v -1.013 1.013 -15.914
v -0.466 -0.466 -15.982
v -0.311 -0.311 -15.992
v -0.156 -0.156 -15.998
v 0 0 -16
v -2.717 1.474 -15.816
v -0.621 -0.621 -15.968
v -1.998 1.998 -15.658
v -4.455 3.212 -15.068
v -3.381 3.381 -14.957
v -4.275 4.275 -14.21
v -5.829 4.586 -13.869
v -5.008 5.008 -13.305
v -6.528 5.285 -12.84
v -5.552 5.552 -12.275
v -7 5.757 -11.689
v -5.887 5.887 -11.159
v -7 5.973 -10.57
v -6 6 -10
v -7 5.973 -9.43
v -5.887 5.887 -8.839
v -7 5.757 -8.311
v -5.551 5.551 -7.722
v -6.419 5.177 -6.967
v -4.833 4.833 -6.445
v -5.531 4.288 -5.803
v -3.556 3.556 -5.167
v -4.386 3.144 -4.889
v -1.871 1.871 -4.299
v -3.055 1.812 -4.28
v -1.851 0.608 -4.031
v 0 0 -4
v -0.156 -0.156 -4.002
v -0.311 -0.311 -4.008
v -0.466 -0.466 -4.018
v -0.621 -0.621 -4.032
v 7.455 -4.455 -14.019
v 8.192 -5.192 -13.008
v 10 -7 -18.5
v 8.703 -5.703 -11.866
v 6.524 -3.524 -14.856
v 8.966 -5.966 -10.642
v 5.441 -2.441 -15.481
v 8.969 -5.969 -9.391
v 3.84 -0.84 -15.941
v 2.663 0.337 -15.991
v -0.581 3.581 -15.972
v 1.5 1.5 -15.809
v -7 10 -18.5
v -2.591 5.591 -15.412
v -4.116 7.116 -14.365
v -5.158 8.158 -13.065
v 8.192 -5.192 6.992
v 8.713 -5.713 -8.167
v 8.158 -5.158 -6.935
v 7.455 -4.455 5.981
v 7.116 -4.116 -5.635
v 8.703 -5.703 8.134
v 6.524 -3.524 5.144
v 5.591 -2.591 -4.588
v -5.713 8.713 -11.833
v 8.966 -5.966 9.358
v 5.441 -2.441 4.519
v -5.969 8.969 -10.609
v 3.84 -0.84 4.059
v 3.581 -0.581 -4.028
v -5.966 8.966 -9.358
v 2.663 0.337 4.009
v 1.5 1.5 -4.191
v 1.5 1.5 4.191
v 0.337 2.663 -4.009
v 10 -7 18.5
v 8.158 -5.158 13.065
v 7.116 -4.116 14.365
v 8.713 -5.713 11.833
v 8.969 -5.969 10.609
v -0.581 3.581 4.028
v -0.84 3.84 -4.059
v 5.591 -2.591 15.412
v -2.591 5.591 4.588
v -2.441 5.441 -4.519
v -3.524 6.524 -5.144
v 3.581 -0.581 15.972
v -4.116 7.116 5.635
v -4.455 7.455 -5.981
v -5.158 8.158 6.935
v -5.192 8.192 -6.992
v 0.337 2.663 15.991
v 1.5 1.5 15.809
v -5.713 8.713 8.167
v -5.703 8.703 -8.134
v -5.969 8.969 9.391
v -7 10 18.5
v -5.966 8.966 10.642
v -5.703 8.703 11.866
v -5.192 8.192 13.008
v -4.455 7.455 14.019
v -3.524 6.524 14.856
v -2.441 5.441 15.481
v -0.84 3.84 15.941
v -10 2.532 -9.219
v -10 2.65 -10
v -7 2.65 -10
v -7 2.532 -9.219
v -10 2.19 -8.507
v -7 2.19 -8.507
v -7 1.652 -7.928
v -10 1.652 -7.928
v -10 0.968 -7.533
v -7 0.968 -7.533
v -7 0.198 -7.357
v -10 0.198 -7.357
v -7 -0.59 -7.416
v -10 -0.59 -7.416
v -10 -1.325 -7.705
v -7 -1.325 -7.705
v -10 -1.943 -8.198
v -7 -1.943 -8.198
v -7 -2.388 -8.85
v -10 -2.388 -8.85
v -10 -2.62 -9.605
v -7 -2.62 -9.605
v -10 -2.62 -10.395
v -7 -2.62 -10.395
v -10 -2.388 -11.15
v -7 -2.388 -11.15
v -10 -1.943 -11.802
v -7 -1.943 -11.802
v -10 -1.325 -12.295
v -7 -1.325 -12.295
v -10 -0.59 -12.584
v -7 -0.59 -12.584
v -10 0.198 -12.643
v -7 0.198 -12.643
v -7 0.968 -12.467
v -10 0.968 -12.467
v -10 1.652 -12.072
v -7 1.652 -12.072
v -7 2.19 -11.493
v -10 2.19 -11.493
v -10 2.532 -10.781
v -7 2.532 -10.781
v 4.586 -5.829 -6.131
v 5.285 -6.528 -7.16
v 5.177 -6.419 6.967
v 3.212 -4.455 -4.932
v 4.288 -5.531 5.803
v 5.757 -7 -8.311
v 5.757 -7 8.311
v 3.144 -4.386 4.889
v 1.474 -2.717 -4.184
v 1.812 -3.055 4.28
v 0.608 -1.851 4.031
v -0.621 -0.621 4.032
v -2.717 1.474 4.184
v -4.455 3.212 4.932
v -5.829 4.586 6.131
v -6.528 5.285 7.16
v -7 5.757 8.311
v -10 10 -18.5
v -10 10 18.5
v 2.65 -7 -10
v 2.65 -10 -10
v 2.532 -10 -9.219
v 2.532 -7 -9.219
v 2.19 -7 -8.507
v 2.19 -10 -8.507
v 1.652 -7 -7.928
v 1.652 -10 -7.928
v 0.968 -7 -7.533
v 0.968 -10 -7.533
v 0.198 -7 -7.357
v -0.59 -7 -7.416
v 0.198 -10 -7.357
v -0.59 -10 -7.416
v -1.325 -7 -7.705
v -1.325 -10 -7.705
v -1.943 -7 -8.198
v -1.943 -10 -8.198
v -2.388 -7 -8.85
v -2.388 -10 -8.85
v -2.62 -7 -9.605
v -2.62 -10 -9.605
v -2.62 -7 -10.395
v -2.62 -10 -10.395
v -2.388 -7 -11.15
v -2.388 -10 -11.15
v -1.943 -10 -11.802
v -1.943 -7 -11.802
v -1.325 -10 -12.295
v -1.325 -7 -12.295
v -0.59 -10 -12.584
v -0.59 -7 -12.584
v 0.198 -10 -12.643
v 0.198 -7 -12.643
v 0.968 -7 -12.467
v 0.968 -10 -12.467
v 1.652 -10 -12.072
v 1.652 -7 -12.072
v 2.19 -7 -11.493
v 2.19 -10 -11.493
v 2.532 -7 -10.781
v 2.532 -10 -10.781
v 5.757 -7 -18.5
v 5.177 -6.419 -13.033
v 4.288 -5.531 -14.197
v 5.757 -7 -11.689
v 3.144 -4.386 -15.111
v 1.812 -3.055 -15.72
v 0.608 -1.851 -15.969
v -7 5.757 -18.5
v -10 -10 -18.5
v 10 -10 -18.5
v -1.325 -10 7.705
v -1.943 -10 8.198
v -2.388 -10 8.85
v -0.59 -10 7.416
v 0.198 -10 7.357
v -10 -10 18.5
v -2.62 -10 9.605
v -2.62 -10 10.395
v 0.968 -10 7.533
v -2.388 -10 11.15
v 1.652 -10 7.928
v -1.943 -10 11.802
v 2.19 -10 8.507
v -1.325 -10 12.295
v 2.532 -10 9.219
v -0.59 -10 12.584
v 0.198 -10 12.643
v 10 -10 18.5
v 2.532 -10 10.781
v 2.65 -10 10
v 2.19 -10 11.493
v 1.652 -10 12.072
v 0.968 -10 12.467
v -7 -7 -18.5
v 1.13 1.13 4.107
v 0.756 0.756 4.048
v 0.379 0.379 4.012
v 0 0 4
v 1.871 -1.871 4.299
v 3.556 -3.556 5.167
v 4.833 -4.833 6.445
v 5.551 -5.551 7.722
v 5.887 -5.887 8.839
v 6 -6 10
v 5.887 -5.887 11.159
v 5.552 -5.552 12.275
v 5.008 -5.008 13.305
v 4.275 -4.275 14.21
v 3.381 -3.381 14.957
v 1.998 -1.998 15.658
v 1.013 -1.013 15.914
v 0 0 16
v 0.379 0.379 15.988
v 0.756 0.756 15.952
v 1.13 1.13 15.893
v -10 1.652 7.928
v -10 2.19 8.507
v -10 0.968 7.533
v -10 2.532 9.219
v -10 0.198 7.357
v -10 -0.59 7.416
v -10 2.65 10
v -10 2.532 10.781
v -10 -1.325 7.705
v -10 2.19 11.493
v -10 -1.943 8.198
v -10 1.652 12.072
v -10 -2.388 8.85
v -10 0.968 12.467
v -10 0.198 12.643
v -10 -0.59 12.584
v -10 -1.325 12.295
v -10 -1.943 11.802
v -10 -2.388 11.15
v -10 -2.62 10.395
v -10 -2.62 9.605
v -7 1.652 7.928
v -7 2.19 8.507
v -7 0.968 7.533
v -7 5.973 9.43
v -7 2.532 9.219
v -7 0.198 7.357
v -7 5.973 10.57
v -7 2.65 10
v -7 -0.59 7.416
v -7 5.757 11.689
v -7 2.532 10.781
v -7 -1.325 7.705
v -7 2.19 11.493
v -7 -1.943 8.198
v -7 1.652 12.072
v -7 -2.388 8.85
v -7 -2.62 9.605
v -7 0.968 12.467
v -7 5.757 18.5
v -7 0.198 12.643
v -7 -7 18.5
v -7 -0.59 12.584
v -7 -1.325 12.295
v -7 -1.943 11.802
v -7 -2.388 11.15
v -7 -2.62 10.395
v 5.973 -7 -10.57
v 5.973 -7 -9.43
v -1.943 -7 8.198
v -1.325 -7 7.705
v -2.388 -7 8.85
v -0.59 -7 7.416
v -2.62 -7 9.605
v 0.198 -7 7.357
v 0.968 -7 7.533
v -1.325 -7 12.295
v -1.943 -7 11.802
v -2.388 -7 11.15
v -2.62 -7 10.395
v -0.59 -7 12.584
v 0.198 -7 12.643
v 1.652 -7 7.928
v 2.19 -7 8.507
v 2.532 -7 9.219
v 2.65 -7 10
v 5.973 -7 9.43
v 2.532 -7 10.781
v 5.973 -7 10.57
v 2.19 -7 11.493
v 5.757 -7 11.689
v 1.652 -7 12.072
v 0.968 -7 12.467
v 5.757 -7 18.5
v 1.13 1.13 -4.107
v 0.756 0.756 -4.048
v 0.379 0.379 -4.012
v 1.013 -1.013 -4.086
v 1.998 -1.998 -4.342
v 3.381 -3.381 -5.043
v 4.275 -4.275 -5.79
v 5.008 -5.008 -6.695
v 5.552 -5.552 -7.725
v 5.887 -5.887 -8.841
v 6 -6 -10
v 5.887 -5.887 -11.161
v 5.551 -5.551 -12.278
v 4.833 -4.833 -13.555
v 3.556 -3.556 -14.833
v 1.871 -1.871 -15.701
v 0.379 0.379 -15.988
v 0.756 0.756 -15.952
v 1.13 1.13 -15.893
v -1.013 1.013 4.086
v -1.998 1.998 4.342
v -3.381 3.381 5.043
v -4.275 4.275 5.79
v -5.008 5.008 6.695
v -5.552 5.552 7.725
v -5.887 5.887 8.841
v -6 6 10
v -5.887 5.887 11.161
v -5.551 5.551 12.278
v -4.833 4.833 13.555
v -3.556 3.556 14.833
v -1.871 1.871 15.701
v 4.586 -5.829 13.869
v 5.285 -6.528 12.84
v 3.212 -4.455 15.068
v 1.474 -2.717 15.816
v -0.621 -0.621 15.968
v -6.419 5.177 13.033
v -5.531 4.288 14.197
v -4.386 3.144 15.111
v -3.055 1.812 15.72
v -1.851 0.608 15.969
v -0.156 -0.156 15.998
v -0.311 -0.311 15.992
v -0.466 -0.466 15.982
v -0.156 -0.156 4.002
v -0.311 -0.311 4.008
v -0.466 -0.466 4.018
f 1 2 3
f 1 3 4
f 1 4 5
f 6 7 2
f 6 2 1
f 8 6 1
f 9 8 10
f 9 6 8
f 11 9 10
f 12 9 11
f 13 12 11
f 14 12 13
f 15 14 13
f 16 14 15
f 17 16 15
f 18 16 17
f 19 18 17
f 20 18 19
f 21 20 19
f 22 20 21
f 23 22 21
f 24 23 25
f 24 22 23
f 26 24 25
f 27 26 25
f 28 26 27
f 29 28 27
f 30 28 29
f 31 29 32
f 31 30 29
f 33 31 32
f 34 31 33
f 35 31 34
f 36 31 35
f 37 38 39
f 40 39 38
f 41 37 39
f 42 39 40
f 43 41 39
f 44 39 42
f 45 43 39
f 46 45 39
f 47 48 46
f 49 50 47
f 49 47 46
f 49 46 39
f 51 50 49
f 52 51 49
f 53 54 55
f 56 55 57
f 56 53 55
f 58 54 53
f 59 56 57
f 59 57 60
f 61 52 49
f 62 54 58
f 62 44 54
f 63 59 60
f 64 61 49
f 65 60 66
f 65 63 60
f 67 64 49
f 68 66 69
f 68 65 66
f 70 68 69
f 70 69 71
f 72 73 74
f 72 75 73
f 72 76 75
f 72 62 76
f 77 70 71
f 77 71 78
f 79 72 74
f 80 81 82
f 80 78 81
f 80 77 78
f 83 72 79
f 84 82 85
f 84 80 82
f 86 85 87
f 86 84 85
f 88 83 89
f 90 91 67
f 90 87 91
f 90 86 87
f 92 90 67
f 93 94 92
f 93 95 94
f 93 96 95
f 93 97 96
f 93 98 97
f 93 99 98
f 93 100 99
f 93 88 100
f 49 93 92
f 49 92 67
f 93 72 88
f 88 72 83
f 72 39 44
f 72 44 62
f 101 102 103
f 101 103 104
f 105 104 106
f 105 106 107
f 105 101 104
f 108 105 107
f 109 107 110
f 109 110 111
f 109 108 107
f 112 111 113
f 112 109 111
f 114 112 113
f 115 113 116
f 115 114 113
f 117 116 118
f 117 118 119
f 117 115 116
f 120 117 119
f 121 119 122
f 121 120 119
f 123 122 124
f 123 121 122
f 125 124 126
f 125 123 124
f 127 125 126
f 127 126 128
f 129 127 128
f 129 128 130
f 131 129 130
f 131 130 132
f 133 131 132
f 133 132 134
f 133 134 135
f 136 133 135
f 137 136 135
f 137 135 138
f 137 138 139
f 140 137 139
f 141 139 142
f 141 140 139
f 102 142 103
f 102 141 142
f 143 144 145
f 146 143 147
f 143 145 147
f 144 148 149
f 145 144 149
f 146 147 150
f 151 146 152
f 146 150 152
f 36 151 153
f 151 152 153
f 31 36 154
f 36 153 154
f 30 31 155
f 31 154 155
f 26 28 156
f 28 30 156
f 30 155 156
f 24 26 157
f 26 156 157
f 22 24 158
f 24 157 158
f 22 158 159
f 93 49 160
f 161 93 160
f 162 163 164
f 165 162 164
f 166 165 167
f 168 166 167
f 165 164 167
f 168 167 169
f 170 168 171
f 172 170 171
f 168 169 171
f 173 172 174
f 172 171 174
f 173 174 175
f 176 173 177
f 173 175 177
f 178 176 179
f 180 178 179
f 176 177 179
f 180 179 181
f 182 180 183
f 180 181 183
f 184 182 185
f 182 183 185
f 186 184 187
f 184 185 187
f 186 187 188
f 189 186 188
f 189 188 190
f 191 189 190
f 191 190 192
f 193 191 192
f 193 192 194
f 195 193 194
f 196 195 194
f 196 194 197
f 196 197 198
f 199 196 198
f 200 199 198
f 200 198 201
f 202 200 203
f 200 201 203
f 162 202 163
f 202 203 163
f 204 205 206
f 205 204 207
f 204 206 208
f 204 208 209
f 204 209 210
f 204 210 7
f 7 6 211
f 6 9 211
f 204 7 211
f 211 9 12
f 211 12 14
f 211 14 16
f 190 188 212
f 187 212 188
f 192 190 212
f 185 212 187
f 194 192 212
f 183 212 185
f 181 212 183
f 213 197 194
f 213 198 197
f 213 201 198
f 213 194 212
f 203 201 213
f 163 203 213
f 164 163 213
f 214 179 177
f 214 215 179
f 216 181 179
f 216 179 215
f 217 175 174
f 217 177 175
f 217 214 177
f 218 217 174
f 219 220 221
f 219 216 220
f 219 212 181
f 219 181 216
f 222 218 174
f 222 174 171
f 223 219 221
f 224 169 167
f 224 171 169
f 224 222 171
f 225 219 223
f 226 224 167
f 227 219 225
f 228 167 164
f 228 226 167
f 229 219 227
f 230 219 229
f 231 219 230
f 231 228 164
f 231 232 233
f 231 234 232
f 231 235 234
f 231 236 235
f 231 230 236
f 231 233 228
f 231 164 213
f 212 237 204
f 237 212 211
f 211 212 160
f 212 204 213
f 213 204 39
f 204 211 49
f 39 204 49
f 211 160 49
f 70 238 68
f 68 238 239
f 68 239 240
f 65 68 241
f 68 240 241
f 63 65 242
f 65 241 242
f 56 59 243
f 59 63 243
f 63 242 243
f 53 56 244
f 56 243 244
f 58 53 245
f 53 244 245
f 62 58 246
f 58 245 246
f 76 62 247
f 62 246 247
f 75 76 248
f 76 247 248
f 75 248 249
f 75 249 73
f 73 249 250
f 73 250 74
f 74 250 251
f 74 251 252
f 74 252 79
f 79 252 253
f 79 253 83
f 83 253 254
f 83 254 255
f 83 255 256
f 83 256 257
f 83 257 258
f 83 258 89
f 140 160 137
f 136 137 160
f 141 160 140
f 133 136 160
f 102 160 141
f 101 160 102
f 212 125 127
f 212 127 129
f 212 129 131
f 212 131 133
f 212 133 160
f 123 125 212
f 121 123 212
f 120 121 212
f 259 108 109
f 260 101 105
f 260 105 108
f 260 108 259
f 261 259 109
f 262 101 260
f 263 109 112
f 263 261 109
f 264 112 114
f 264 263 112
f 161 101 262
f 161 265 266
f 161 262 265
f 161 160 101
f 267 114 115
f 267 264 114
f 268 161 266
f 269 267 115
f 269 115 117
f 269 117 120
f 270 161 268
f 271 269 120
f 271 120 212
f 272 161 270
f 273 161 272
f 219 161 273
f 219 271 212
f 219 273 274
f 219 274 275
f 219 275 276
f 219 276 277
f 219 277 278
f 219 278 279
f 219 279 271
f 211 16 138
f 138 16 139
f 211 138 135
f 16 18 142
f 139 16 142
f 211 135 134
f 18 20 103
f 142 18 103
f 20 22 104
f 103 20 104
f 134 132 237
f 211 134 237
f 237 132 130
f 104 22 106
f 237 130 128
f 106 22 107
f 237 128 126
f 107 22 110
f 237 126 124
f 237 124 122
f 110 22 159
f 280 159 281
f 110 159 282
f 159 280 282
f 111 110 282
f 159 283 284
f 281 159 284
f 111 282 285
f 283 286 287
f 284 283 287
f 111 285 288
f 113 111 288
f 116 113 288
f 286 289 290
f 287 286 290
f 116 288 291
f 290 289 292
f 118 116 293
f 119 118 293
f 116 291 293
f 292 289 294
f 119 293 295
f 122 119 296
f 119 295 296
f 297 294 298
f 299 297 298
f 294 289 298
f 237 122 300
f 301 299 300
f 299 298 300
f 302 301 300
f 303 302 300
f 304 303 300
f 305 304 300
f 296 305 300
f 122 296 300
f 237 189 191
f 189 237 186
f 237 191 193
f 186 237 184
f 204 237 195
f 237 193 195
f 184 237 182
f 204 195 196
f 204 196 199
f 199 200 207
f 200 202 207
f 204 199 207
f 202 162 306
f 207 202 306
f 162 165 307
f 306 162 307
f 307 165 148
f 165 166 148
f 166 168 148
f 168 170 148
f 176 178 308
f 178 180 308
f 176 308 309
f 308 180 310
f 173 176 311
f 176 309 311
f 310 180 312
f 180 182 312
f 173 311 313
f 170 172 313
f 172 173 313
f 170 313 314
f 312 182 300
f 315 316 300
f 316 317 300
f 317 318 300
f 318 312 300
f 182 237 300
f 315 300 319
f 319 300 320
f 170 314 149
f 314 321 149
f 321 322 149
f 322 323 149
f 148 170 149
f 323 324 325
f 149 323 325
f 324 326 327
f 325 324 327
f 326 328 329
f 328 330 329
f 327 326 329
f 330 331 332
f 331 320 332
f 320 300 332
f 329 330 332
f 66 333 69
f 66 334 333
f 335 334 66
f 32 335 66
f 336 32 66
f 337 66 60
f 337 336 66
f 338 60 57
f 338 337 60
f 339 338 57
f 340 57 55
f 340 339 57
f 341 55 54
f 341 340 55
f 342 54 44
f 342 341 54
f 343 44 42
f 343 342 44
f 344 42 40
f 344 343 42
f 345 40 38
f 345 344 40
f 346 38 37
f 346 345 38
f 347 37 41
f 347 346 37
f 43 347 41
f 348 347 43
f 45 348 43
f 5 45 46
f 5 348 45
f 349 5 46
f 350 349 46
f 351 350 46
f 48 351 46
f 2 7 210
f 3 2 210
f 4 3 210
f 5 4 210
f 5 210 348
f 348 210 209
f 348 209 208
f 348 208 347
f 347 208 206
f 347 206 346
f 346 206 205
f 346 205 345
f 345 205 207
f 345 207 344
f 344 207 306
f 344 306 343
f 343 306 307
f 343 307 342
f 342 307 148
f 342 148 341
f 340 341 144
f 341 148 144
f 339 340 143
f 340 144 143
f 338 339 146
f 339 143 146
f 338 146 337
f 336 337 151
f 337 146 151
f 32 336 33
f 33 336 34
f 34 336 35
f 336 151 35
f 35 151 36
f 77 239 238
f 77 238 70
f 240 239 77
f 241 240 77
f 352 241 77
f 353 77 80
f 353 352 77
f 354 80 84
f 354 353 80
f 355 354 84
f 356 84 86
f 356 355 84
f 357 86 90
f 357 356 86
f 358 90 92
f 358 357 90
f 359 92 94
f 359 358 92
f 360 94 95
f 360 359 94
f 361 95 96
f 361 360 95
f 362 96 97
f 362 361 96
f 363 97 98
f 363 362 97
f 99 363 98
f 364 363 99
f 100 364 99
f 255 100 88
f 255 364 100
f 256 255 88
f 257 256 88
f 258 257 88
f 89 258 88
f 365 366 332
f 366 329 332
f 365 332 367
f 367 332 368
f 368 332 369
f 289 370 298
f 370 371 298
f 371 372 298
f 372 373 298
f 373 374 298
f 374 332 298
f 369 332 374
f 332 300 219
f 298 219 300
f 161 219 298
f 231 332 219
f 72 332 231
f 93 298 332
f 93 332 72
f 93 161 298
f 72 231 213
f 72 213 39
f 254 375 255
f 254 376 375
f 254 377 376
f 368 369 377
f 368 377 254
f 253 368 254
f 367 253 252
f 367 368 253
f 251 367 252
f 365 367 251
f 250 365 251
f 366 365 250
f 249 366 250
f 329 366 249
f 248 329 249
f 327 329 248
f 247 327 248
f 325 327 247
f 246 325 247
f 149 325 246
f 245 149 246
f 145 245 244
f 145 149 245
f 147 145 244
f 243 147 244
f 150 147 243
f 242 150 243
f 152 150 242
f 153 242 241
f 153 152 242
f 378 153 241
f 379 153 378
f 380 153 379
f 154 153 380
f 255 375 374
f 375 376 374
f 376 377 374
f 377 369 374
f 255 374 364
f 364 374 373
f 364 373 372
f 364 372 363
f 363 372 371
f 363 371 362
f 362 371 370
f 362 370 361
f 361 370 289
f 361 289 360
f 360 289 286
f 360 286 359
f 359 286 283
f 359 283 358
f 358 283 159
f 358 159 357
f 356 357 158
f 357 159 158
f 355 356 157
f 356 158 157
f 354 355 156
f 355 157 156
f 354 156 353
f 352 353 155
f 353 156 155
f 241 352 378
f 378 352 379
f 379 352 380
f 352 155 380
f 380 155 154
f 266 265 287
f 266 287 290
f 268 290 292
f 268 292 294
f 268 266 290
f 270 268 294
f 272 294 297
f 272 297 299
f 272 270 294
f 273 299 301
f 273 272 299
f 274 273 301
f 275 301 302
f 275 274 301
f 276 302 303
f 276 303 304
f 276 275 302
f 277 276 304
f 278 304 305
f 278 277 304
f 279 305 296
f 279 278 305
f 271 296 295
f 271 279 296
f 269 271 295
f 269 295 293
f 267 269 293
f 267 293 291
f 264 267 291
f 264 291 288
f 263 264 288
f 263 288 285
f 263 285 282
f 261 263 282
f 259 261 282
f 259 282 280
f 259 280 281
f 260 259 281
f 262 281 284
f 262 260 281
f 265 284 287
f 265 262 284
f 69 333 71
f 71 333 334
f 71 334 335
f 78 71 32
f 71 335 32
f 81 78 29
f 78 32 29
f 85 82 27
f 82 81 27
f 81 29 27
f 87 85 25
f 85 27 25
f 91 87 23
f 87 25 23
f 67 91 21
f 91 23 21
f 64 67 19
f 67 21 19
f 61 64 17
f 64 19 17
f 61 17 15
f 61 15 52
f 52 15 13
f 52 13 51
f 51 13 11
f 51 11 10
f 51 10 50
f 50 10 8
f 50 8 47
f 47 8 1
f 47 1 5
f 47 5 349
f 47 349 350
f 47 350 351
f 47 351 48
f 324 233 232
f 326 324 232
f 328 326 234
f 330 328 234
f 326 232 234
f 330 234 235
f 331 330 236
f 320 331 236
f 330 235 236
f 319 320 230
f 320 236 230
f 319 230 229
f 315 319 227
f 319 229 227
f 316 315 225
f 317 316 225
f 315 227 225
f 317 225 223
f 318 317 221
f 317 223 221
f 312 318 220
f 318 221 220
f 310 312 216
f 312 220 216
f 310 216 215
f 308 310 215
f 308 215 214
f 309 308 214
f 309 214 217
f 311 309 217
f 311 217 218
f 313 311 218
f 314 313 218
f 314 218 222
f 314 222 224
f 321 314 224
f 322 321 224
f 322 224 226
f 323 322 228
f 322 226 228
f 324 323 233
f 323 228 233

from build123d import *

# Parameters (mm, degrees)
BOSS_EXTRUDE1_DEPTH     = 18.5
SKETCH4_R               = 2.65
CUT_EXTRUDE1_DEPTH      = 3
SKETCH6_R               = 6
CUT_EXTRUDE2_DEPTH      = 18
MIRROR2_COPY_1_SKETCH_R = 2.65
MIRROR2_COPY_1_DEPTH    = 3
MIRROR2_COPY_2_SKETCH_R = 6
MIRROR2_COPY_2_DEPTH    = 18
MIRROR2_COPY_3_SKETCH_R = 2.65
MIRROR2_COPY_3_DEPTH    = 3


with BuildPart() as part:
    # Sketch2 → Boss-Extrude1 (new body, symmetric)
    with BuildSketch(Plane.XY):
        Polygon((-10, 10), (-10, -10), (10, -10), (10, -7), (-7, 10), align=None)
        Polygon((-7, 5.757359313), (-7, -7), (5.757359313, -7), align=None, mode=Mode.SUBTRACT)
    extrude(amount=BOSS_EXTRUDE1_DEPTH, both=True)

    # Sketch4 → Cut-Extrude1 (cut)
    with BuildSketch(Plane.XZ.offset(10)):
        with Locations((0, -10)):
            Circle(SKETCH4_R)
        with Locations((0, 10)):
            Circle(SKETCH4_R)
    cut_extrude1 = extrude(amount=-CUT_EXTRUDE1_DEPTH, mode=Mode.SUBTRACT)

    # Sketch6 → Cut-Extrude2 (cut, through all)
    with BuildSketch(Plane(origin=(0, -7, 0), x_dir=(1, 0, 0), z_dir=(0, 1, 0))):
        with Locations((0, -10)):
            Circle(SKETCH6_R)
    cut_extrude2 = extrude(amount=CUT_EXTRUDE2_DEPTH, mode=Mode.SUBTRACT)

    # Mirror1: Cut-Extrude1, Cut-Extrude2 across plane
    add(cut_extrude1.mirror(Plane(origin=(0, 0, 0), x_dir=(0, 0, 1), z_dir=(0.707106781, -0.707106781, 0))), mode=Mode.SUBTRACT)
    add(cut_extrude2.mirror(Plane(origin=(0, 0, 0), x_dir=(0, 0, 1), z_dir=(0.707106781, -0.707106781, 0))), mode=Mode.SUBTRACT)

    # Mirror2: Cut-Extrude2 across plane
    add(cut_extrude2.mirror(Plane.XY), mode=Mode.SUBTRACT)

    # Mirror2 copy 1 sketch → Mirror2 copy 1 (cut)
    with BuildSketch(Plane(origin=(-10, 0, 0), x_dir=(0, 1, 0), z_dir=(-1, 0, 0))):
        with Locations((0, -10)):
            Circle(MIRROR2_COPY_1_SKETCH_R)
        with Locations((0, 10)):
            Circle(MIRROR2_COPY_1_SKETCH_R)
    extrude(amount=-MIRROR2_COPY_1_DEPTH, mode=Mode.SUBTRACT)

    # Mirror2 copy 2 sketch → Mirror2 copy 2 (cut, through all)
    with BuildSketch(Plane.YZ.offset(-7)):
        with Locations((0, -10)):
            Circle(MIRROR2_COPY_2_SKETCH_R)
    extrude(amount=MIRROR2_COPY_2_DEPTH, mode=Mode.SUBTRACT)

    # Mirror2 copy 3 sketch → Mirror2 copy 3 (cut)
    with BuildSketch(Plane.XZ.offset(10)):
        with Locations((0, 10)):
            Circle(MIRROR2_COPY_3_SKETCH_R)
        with Locations((0, -10)):
            Circle(MIRROR2_COPY_3_SKETCH_R)
    extrude(amount=-MIRROR2_COPY_3_DEPTH, mode=Mode.SUBTRACT)


solid = part.part
